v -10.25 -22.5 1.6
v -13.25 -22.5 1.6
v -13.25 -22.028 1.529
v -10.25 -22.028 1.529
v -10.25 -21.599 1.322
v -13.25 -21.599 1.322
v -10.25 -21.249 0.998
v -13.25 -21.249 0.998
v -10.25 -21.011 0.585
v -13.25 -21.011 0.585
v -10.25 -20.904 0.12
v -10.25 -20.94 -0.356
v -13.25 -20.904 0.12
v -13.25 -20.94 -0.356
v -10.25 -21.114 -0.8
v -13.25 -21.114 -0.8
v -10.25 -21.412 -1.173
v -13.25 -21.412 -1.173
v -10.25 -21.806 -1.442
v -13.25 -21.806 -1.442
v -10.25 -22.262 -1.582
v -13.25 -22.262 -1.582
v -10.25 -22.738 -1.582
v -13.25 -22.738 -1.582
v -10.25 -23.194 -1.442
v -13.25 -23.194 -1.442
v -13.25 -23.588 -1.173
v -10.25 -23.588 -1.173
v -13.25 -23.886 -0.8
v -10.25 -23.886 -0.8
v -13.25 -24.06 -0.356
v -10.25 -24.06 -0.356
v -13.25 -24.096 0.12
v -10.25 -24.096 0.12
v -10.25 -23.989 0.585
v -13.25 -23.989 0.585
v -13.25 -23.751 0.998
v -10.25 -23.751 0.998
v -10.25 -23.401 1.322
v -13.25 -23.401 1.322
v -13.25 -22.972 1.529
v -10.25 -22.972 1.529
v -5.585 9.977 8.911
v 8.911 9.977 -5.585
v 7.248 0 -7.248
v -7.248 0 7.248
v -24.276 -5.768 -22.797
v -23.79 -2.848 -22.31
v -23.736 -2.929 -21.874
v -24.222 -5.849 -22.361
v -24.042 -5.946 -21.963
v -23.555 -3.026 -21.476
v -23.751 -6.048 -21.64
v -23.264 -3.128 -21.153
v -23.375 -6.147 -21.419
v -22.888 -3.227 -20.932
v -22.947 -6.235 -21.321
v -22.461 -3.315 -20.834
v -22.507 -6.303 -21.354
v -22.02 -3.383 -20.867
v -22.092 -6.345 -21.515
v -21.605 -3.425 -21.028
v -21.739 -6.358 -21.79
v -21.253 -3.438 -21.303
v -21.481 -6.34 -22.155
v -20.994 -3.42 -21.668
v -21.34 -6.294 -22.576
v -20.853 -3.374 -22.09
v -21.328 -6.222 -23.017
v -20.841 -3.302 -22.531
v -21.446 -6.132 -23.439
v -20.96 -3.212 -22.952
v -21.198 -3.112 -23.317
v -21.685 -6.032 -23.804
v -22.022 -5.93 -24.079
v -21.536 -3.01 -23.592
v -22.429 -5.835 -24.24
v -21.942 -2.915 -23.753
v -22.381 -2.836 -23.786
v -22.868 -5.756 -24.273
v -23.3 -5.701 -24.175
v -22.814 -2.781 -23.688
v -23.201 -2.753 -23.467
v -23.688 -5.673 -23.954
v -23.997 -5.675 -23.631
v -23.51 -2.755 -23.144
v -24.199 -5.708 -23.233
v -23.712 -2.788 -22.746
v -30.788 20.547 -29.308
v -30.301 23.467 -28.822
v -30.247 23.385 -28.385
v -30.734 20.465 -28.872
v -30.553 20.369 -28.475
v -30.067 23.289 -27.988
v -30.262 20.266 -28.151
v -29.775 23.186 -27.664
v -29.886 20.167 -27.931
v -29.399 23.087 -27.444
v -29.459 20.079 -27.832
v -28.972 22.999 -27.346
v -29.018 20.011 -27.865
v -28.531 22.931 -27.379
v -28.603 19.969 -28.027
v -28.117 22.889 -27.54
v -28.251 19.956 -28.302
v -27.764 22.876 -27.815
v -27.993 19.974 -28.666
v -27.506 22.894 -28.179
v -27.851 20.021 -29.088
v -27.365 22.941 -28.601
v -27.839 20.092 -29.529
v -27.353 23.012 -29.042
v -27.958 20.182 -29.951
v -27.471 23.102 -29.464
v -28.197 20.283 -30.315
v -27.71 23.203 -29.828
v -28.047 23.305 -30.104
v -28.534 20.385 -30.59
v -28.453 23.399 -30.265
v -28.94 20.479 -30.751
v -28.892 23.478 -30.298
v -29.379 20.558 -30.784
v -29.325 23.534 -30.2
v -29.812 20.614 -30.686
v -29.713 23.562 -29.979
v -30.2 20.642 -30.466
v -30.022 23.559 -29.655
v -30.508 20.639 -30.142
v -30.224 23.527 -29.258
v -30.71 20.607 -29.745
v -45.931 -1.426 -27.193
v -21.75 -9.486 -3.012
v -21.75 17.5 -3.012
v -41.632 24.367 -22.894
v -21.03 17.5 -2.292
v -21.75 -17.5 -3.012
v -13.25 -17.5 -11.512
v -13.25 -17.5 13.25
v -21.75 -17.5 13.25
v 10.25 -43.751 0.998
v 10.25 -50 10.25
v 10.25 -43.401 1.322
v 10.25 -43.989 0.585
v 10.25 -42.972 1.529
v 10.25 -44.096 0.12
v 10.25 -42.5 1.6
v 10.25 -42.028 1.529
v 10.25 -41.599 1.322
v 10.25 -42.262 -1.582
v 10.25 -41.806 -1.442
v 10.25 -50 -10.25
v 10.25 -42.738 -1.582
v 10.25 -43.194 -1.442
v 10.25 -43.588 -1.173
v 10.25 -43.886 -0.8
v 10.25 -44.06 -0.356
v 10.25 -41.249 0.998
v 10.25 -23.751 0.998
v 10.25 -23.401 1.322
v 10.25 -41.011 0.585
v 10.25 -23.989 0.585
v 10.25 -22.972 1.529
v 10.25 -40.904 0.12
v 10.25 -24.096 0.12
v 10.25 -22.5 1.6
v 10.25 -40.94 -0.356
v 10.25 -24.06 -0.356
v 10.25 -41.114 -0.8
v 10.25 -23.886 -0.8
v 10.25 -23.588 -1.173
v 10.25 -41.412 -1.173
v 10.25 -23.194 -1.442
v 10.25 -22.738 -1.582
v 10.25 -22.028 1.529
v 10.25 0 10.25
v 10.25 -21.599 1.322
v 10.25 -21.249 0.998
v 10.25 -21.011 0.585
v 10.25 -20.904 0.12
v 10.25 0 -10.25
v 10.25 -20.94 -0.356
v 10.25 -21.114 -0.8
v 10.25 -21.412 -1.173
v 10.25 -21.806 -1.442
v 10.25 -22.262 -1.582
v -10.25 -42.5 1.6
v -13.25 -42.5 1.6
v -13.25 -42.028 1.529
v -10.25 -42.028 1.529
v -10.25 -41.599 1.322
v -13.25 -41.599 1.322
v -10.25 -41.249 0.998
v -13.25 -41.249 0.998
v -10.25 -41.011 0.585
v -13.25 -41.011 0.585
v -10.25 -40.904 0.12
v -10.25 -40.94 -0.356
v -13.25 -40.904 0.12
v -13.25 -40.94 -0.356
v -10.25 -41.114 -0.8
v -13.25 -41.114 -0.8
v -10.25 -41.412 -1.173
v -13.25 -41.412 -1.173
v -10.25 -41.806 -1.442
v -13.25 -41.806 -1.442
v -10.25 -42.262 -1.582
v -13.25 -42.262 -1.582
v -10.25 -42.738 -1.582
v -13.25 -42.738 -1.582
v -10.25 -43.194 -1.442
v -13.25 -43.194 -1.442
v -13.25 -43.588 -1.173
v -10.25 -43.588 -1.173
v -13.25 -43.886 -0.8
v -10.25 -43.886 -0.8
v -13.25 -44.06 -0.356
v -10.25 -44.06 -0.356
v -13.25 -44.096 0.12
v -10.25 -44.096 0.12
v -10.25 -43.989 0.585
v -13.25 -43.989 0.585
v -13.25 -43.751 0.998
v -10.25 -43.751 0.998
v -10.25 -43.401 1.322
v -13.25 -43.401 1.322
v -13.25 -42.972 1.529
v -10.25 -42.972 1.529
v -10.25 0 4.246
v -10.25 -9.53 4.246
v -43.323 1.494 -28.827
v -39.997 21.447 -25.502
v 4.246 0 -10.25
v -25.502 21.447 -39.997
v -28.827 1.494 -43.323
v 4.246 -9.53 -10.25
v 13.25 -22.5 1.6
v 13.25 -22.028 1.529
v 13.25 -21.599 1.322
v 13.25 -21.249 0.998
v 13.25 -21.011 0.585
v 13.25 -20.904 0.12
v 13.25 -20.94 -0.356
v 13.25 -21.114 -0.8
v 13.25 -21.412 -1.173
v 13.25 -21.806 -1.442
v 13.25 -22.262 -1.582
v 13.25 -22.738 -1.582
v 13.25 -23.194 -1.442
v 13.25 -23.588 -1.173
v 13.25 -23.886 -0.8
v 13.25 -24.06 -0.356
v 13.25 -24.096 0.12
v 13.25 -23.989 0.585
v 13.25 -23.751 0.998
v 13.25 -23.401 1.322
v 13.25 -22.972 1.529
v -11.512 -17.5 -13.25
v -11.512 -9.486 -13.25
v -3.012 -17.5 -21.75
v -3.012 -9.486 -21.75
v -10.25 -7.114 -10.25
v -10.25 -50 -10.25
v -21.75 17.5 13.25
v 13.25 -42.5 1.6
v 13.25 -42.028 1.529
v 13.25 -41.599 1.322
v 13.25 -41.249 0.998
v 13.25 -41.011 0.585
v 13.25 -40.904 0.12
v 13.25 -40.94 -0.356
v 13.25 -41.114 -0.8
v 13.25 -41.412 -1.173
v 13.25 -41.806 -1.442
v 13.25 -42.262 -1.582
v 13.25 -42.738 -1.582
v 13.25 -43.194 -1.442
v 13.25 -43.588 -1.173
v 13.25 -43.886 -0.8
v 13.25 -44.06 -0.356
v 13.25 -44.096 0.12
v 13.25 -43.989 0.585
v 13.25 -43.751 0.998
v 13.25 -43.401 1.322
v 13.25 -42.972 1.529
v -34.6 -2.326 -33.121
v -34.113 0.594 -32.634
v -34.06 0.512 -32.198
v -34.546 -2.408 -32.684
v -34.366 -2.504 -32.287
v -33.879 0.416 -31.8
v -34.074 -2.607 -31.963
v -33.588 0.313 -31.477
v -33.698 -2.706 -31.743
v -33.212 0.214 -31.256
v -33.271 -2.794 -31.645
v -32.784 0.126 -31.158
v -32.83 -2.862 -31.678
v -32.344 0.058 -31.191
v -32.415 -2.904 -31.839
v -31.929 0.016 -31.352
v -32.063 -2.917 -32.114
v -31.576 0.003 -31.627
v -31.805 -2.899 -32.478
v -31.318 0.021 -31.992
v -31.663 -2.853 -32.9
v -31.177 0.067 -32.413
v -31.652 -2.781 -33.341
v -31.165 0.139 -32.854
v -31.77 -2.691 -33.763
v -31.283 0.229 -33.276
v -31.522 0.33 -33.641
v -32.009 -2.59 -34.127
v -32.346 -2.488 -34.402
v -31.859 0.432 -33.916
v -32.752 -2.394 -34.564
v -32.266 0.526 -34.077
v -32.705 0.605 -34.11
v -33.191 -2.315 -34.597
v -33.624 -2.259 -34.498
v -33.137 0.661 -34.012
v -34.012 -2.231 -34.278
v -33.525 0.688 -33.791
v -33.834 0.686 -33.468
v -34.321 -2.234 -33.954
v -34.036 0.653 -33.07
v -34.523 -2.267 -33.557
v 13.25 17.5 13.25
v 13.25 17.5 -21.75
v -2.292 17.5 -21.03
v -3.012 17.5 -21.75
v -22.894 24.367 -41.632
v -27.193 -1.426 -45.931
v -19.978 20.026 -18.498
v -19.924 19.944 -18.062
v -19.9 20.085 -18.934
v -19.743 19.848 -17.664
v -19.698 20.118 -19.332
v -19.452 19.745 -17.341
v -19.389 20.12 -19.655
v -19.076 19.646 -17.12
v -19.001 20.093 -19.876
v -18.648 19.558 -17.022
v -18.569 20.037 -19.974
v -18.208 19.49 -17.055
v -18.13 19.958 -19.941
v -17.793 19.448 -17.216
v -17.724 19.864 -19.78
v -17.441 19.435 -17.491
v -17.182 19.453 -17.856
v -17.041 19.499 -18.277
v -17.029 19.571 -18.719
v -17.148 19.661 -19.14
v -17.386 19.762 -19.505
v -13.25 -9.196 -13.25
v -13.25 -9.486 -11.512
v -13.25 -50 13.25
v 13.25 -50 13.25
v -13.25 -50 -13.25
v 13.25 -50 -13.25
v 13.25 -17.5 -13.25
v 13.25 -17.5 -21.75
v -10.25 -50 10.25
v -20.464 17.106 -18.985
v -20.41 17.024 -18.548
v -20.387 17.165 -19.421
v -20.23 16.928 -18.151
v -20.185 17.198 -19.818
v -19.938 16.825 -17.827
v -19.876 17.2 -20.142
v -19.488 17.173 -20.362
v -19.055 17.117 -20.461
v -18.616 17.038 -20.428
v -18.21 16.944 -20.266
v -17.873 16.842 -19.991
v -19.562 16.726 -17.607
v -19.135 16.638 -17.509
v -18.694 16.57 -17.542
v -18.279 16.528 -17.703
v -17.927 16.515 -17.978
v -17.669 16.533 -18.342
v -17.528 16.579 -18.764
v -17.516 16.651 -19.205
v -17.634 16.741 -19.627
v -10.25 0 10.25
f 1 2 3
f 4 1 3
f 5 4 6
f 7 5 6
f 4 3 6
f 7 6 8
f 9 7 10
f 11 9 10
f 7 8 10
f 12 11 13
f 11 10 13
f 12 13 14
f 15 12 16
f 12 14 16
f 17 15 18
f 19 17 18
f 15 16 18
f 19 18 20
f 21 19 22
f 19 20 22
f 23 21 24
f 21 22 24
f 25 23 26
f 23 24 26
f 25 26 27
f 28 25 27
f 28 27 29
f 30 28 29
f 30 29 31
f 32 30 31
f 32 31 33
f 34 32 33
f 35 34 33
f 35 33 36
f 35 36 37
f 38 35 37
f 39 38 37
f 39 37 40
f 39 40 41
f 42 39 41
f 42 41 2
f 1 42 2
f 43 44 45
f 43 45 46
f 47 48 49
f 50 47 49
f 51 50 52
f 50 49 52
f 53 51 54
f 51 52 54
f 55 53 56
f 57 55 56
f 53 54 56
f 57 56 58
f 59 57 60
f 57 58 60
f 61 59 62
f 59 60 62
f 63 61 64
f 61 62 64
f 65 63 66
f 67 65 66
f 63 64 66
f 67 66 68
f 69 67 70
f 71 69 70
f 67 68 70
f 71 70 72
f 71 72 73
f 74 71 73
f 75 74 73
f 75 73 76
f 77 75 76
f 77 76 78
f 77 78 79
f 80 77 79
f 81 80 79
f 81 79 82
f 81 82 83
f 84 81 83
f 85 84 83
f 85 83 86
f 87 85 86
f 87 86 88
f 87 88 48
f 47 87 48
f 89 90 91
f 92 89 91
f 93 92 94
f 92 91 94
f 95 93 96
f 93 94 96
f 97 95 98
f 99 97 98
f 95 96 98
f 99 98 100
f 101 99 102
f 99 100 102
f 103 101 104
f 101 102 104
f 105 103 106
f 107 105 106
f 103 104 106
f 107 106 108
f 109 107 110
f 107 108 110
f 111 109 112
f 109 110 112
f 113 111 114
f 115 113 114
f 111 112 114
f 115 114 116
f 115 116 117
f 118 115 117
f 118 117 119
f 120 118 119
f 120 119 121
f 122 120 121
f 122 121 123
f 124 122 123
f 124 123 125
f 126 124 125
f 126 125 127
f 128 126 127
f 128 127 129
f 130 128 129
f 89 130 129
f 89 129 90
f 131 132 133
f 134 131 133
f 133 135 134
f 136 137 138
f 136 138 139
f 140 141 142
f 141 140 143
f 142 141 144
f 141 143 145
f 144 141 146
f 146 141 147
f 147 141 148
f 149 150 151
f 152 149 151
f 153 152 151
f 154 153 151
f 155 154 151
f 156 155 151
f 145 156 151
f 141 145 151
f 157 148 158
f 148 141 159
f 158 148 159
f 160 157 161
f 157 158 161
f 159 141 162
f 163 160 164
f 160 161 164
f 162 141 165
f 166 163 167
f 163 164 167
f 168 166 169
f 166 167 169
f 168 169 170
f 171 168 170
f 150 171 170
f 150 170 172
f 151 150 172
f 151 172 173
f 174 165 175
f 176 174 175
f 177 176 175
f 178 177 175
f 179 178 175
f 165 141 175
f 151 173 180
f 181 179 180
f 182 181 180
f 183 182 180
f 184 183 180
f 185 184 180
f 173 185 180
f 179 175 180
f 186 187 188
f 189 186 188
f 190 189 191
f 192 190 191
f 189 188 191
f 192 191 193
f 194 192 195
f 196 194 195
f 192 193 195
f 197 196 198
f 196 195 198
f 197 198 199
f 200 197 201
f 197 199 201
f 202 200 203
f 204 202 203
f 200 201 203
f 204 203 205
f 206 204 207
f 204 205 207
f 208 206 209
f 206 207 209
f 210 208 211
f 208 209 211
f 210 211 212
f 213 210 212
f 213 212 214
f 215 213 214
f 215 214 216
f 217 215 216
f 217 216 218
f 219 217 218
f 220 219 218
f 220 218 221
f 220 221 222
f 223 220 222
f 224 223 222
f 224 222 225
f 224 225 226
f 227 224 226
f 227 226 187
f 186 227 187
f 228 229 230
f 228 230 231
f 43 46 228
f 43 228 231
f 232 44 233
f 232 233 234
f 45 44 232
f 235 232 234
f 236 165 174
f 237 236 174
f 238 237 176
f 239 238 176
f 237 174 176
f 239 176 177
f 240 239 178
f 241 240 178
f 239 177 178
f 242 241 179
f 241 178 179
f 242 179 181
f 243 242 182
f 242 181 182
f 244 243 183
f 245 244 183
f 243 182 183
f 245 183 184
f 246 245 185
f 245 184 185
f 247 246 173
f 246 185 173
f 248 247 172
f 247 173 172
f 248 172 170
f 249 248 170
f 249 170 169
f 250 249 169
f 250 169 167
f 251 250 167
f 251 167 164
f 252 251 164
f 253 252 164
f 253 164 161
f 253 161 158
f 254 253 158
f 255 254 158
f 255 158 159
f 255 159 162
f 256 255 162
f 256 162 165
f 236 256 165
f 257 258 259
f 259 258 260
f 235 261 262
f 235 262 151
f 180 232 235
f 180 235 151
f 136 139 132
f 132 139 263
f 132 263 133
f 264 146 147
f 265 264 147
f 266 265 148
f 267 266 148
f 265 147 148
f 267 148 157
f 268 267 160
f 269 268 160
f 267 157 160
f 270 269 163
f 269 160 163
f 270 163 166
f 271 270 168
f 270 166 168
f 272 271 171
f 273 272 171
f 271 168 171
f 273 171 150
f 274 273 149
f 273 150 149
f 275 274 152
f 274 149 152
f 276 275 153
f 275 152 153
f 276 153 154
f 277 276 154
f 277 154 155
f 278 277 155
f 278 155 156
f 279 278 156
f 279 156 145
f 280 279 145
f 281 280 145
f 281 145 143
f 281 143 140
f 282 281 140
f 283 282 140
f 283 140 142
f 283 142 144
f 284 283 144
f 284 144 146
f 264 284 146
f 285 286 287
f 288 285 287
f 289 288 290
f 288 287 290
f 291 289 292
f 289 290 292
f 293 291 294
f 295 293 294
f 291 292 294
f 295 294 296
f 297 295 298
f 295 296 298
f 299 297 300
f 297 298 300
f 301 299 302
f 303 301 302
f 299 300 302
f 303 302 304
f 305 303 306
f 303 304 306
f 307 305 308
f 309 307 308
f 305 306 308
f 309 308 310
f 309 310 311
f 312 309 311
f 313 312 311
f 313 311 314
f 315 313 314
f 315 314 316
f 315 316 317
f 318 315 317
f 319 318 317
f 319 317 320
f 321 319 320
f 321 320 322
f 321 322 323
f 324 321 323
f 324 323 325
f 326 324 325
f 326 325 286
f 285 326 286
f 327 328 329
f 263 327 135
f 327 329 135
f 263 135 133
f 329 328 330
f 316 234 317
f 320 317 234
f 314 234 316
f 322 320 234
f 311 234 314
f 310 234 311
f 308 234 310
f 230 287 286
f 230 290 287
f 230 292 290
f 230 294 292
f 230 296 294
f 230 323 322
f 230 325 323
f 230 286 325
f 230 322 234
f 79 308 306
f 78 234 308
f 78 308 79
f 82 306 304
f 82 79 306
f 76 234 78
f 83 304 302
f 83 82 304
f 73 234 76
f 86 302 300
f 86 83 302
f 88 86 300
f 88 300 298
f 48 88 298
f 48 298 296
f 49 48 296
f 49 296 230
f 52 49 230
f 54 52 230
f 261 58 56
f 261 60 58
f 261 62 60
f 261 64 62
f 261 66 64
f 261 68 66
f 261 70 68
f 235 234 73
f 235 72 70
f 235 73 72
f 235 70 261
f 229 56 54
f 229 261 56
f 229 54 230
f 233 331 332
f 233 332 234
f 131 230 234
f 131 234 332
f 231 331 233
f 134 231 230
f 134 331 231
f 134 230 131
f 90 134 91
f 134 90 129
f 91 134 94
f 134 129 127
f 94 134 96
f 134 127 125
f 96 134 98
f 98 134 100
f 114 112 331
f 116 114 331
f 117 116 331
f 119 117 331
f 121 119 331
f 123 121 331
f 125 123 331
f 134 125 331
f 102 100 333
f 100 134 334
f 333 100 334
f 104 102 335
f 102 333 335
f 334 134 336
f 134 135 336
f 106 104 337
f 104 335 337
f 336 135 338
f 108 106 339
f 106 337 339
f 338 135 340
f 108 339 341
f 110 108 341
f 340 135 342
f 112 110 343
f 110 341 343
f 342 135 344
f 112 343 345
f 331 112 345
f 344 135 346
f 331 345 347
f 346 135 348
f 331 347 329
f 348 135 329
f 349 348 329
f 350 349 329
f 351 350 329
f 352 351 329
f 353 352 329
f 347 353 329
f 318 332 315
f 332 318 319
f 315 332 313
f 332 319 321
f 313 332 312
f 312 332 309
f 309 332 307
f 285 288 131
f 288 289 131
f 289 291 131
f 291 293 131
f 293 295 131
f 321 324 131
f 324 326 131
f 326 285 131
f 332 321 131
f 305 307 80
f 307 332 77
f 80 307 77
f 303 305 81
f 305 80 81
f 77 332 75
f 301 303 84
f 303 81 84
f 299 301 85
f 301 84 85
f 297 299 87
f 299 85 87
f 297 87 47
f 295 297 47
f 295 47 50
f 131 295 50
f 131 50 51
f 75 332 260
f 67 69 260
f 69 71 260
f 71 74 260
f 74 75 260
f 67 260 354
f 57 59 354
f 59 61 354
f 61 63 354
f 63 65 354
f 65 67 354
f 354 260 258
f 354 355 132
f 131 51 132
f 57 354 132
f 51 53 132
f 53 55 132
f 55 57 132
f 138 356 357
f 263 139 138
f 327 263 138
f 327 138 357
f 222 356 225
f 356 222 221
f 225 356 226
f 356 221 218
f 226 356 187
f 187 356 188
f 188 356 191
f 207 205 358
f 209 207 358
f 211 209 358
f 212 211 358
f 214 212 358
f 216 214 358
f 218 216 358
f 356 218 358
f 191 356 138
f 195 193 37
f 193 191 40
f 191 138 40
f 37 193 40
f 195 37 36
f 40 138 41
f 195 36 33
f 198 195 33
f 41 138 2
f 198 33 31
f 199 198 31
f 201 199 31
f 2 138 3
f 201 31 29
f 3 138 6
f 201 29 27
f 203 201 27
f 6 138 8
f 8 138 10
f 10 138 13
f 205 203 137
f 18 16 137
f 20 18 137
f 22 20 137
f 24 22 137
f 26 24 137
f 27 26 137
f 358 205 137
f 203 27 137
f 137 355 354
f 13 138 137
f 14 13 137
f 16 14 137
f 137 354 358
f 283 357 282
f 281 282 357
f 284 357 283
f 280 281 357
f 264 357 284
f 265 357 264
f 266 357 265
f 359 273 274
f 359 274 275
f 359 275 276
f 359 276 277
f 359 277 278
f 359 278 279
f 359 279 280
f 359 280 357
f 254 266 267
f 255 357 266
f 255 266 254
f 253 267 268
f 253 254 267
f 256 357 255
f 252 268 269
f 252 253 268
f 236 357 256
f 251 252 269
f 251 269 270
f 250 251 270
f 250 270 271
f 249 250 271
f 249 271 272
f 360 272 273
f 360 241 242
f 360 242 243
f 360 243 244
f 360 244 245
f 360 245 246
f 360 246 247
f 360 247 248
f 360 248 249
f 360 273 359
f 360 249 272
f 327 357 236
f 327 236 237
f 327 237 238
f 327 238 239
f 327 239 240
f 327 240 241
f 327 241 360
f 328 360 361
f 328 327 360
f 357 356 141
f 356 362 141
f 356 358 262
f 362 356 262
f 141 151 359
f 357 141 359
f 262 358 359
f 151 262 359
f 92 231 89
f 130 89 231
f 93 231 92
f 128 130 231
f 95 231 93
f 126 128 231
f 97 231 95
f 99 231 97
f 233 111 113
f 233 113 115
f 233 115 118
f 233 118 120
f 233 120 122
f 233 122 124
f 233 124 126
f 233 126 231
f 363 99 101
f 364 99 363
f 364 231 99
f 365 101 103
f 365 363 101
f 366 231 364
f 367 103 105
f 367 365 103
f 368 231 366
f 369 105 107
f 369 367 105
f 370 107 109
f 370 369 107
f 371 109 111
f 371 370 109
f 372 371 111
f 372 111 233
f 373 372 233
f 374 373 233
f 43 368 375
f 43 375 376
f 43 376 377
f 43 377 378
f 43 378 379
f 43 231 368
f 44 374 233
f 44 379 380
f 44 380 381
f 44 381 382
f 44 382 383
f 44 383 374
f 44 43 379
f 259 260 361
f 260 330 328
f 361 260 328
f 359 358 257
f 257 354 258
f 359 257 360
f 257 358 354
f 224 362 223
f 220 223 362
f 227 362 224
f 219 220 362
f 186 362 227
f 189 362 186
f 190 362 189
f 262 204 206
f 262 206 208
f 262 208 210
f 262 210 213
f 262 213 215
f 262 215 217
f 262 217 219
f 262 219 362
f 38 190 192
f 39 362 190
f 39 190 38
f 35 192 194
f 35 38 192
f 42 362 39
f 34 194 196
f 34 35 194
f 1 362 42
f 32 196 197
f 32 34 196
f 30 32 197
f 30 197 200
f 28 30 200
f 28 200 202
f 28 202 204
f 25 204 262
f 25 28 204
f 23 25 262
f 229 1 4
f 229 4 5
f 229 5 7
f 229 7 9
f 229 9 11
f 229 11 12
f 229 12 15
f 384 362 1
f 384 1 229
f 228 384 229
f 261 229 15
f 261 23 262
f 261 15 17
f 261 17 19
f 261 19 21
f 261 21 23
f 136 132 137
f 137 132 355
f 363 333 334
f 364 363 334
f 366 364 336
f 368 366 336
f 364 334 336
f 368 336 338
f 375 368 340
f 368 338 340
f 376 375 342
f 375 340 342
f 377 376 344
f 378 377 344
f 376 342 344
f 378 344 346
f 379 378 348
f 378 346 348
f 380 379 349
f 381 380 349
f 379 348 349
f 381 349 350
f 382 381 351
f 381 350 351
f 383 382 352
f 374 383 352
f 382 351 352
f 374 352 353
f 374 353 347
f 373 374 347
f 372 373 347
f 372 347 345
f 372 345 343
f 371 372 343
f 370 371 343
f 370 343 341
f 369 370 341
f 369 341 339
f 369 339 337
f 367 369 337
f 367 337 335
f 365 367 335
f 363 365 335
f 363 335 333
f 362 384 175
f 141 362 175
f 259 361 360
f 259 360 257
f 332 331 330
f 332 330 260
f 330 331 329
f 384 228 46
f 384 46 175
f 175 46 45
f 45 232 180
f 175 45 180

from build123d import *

# Parameters (mm, degrees)
SKETCH_4_W          = 26.5
SKETCH_4_H          = 26.5
SKETCH_4_W_2        = 20.5
SKETCH_4_H_2        = 20.5
EXTRUDE_1_DEPTH     = 50
EXTRUDE_2_DEPTH     = 50
EXTRUDE_3_DEPTH     = 17.5
SKETCH_4_2_W        = 20.5
SKETCH_4_2_H        = 20.5
CUT_EXTRUDE_1_DEPTH = 82.971372719
CUT_EXTRUDE_2_DEPTH = 82.971372719
SKETCH_7_R          = 1.5
CUT_EXTRUDE_3_DEPTH = 93.625217786
SKETCH_8_R          = 1.6
CUT_EXTRUDE_4_DEPTH = 76.350501248


with BuildPart() as part:
    # 草图4 → 凸台-拉伸1 (new body)
    with BuildSketch(Plane(origin=(0, 0, 0), x_dir=(1, 0, 0), z_dir=(0, 1, 0))):
        Rectangle(SKETCH_4_W, SKETCH_4_H)
        Rectangle(SKETCH_4_W_2, SKETCH_4_H_2, mode=Mode.SUBTRACT)
    extrude(amount=-EXTRUDE_1_DEPTH)

    # 草图5 → 凸台-拉伸2 (add)
    with BuildSketch(Plane(origin=(0, 0, 0), x_dir=(0.7254762501100117, 0.21764287503300356, -0.6529286250990104), z_dir=(0.6882472016116853, -0.22941573387056186, 0.6882472016116854))):
        Polygon((15.877292577, 9.951712437), (-9.951712437, 15.877292577), (-15.877292577, -9.951712437), (9.951712437, -15.877292577), align=None)
        Polygon((-12.28243388, -7.698494526), (-7.698494526, 12.28243388), (12.28243388, 7.698494526), (7.698494526, -12.28243388), align=None, mode=Mode.SUBTRACT)
    extrude(amount=-EXTRUDE_2_DEPTH)

    # 草图6 → 凸台-拉伸3 (add, symmetric)
    with BuildSketch(Plane(origin=(0, 0, 0), x_dir=(1, 0, 0), z_dir=(0, 1, 0))):
        Polygon((13.25, -13.25), (-21.75, -13.25), (-21.75, 3.011670299), (-3.011670299, 21.75), (13.25, 21.75), align=None)
    extrude(amount=EXTRUDE_3_DEPTH, both=True)

    # 草图4<2> → 切除-拉伸1 (cut, through all)
    with BuildSketch(Plane(origin=(0, 0, 0), x_dir=(1, 0, 0), z_dir=(0, 1, 0))):
        Rectangle(SKETCH_4_2_W, SKETCH_4_2_H)
    extrude(amount=-CUT_EXTRUDE_1_DEPTH, mode=Mode.SUBTRACT)

    # 草图5<2> → 切除-拉伸2 (cut, through all)
    with BuildSketch(Plane(origin=(0, 0, 0), x_dir=(0.7254762501100117, 0.21764287503300356, -0.6529286250990104), z_dir=(0.6882472016116853, -0.22941573387056186, 0.6882472016116854))):
        Polygon((12.28243388, 7.698494526), (-7.698494526, 12.28243388), (-12.28243388, -7.698494526), (7.698494526, -12.28243388), align=None)
    extrude(amount=-CUT_EXTRUDE_2_DEPTH, mode=Mode.SUBTRACT)

    # 草图7 → 切除-拉伸3 (cut, through all)
    with BuildSketch(Plane(origin=(2.14943383, 12.89660298, 2.14943383), x_dir=(0.9867543820659302, -0.16001422411879954, -0.026669037353133265), z_dir=(0.1622214211307626, 0.9733285267845754, 0.1622214211307625))):
        with Locations((-31.386862461, 32.246935744)):
            Circle(SKETCH_7_R)
        with Locations((-20.924574974, 21.497957163)):
            Circle(SKETCH_7_R)
    extrude(amount=-CUT_EXTRUDE_3_DEPTH, mode=Mode.SUBTRACT)

    # 草图8 → 切除-拉伸4 (cut, through all)
    with BuildSketch(Plane.ZY.offset(13.25)):
        with Locations((0, -22.5)):
            Circle(SKETCH_8_R)
        with Locations((0, -42.5)):
            Circle(SKETCH_8_R)
    extrude(amount=-CUT_EXTRUDE_4_DEPTH, mode=Mode.SUBTRACT)


solid = part.part
